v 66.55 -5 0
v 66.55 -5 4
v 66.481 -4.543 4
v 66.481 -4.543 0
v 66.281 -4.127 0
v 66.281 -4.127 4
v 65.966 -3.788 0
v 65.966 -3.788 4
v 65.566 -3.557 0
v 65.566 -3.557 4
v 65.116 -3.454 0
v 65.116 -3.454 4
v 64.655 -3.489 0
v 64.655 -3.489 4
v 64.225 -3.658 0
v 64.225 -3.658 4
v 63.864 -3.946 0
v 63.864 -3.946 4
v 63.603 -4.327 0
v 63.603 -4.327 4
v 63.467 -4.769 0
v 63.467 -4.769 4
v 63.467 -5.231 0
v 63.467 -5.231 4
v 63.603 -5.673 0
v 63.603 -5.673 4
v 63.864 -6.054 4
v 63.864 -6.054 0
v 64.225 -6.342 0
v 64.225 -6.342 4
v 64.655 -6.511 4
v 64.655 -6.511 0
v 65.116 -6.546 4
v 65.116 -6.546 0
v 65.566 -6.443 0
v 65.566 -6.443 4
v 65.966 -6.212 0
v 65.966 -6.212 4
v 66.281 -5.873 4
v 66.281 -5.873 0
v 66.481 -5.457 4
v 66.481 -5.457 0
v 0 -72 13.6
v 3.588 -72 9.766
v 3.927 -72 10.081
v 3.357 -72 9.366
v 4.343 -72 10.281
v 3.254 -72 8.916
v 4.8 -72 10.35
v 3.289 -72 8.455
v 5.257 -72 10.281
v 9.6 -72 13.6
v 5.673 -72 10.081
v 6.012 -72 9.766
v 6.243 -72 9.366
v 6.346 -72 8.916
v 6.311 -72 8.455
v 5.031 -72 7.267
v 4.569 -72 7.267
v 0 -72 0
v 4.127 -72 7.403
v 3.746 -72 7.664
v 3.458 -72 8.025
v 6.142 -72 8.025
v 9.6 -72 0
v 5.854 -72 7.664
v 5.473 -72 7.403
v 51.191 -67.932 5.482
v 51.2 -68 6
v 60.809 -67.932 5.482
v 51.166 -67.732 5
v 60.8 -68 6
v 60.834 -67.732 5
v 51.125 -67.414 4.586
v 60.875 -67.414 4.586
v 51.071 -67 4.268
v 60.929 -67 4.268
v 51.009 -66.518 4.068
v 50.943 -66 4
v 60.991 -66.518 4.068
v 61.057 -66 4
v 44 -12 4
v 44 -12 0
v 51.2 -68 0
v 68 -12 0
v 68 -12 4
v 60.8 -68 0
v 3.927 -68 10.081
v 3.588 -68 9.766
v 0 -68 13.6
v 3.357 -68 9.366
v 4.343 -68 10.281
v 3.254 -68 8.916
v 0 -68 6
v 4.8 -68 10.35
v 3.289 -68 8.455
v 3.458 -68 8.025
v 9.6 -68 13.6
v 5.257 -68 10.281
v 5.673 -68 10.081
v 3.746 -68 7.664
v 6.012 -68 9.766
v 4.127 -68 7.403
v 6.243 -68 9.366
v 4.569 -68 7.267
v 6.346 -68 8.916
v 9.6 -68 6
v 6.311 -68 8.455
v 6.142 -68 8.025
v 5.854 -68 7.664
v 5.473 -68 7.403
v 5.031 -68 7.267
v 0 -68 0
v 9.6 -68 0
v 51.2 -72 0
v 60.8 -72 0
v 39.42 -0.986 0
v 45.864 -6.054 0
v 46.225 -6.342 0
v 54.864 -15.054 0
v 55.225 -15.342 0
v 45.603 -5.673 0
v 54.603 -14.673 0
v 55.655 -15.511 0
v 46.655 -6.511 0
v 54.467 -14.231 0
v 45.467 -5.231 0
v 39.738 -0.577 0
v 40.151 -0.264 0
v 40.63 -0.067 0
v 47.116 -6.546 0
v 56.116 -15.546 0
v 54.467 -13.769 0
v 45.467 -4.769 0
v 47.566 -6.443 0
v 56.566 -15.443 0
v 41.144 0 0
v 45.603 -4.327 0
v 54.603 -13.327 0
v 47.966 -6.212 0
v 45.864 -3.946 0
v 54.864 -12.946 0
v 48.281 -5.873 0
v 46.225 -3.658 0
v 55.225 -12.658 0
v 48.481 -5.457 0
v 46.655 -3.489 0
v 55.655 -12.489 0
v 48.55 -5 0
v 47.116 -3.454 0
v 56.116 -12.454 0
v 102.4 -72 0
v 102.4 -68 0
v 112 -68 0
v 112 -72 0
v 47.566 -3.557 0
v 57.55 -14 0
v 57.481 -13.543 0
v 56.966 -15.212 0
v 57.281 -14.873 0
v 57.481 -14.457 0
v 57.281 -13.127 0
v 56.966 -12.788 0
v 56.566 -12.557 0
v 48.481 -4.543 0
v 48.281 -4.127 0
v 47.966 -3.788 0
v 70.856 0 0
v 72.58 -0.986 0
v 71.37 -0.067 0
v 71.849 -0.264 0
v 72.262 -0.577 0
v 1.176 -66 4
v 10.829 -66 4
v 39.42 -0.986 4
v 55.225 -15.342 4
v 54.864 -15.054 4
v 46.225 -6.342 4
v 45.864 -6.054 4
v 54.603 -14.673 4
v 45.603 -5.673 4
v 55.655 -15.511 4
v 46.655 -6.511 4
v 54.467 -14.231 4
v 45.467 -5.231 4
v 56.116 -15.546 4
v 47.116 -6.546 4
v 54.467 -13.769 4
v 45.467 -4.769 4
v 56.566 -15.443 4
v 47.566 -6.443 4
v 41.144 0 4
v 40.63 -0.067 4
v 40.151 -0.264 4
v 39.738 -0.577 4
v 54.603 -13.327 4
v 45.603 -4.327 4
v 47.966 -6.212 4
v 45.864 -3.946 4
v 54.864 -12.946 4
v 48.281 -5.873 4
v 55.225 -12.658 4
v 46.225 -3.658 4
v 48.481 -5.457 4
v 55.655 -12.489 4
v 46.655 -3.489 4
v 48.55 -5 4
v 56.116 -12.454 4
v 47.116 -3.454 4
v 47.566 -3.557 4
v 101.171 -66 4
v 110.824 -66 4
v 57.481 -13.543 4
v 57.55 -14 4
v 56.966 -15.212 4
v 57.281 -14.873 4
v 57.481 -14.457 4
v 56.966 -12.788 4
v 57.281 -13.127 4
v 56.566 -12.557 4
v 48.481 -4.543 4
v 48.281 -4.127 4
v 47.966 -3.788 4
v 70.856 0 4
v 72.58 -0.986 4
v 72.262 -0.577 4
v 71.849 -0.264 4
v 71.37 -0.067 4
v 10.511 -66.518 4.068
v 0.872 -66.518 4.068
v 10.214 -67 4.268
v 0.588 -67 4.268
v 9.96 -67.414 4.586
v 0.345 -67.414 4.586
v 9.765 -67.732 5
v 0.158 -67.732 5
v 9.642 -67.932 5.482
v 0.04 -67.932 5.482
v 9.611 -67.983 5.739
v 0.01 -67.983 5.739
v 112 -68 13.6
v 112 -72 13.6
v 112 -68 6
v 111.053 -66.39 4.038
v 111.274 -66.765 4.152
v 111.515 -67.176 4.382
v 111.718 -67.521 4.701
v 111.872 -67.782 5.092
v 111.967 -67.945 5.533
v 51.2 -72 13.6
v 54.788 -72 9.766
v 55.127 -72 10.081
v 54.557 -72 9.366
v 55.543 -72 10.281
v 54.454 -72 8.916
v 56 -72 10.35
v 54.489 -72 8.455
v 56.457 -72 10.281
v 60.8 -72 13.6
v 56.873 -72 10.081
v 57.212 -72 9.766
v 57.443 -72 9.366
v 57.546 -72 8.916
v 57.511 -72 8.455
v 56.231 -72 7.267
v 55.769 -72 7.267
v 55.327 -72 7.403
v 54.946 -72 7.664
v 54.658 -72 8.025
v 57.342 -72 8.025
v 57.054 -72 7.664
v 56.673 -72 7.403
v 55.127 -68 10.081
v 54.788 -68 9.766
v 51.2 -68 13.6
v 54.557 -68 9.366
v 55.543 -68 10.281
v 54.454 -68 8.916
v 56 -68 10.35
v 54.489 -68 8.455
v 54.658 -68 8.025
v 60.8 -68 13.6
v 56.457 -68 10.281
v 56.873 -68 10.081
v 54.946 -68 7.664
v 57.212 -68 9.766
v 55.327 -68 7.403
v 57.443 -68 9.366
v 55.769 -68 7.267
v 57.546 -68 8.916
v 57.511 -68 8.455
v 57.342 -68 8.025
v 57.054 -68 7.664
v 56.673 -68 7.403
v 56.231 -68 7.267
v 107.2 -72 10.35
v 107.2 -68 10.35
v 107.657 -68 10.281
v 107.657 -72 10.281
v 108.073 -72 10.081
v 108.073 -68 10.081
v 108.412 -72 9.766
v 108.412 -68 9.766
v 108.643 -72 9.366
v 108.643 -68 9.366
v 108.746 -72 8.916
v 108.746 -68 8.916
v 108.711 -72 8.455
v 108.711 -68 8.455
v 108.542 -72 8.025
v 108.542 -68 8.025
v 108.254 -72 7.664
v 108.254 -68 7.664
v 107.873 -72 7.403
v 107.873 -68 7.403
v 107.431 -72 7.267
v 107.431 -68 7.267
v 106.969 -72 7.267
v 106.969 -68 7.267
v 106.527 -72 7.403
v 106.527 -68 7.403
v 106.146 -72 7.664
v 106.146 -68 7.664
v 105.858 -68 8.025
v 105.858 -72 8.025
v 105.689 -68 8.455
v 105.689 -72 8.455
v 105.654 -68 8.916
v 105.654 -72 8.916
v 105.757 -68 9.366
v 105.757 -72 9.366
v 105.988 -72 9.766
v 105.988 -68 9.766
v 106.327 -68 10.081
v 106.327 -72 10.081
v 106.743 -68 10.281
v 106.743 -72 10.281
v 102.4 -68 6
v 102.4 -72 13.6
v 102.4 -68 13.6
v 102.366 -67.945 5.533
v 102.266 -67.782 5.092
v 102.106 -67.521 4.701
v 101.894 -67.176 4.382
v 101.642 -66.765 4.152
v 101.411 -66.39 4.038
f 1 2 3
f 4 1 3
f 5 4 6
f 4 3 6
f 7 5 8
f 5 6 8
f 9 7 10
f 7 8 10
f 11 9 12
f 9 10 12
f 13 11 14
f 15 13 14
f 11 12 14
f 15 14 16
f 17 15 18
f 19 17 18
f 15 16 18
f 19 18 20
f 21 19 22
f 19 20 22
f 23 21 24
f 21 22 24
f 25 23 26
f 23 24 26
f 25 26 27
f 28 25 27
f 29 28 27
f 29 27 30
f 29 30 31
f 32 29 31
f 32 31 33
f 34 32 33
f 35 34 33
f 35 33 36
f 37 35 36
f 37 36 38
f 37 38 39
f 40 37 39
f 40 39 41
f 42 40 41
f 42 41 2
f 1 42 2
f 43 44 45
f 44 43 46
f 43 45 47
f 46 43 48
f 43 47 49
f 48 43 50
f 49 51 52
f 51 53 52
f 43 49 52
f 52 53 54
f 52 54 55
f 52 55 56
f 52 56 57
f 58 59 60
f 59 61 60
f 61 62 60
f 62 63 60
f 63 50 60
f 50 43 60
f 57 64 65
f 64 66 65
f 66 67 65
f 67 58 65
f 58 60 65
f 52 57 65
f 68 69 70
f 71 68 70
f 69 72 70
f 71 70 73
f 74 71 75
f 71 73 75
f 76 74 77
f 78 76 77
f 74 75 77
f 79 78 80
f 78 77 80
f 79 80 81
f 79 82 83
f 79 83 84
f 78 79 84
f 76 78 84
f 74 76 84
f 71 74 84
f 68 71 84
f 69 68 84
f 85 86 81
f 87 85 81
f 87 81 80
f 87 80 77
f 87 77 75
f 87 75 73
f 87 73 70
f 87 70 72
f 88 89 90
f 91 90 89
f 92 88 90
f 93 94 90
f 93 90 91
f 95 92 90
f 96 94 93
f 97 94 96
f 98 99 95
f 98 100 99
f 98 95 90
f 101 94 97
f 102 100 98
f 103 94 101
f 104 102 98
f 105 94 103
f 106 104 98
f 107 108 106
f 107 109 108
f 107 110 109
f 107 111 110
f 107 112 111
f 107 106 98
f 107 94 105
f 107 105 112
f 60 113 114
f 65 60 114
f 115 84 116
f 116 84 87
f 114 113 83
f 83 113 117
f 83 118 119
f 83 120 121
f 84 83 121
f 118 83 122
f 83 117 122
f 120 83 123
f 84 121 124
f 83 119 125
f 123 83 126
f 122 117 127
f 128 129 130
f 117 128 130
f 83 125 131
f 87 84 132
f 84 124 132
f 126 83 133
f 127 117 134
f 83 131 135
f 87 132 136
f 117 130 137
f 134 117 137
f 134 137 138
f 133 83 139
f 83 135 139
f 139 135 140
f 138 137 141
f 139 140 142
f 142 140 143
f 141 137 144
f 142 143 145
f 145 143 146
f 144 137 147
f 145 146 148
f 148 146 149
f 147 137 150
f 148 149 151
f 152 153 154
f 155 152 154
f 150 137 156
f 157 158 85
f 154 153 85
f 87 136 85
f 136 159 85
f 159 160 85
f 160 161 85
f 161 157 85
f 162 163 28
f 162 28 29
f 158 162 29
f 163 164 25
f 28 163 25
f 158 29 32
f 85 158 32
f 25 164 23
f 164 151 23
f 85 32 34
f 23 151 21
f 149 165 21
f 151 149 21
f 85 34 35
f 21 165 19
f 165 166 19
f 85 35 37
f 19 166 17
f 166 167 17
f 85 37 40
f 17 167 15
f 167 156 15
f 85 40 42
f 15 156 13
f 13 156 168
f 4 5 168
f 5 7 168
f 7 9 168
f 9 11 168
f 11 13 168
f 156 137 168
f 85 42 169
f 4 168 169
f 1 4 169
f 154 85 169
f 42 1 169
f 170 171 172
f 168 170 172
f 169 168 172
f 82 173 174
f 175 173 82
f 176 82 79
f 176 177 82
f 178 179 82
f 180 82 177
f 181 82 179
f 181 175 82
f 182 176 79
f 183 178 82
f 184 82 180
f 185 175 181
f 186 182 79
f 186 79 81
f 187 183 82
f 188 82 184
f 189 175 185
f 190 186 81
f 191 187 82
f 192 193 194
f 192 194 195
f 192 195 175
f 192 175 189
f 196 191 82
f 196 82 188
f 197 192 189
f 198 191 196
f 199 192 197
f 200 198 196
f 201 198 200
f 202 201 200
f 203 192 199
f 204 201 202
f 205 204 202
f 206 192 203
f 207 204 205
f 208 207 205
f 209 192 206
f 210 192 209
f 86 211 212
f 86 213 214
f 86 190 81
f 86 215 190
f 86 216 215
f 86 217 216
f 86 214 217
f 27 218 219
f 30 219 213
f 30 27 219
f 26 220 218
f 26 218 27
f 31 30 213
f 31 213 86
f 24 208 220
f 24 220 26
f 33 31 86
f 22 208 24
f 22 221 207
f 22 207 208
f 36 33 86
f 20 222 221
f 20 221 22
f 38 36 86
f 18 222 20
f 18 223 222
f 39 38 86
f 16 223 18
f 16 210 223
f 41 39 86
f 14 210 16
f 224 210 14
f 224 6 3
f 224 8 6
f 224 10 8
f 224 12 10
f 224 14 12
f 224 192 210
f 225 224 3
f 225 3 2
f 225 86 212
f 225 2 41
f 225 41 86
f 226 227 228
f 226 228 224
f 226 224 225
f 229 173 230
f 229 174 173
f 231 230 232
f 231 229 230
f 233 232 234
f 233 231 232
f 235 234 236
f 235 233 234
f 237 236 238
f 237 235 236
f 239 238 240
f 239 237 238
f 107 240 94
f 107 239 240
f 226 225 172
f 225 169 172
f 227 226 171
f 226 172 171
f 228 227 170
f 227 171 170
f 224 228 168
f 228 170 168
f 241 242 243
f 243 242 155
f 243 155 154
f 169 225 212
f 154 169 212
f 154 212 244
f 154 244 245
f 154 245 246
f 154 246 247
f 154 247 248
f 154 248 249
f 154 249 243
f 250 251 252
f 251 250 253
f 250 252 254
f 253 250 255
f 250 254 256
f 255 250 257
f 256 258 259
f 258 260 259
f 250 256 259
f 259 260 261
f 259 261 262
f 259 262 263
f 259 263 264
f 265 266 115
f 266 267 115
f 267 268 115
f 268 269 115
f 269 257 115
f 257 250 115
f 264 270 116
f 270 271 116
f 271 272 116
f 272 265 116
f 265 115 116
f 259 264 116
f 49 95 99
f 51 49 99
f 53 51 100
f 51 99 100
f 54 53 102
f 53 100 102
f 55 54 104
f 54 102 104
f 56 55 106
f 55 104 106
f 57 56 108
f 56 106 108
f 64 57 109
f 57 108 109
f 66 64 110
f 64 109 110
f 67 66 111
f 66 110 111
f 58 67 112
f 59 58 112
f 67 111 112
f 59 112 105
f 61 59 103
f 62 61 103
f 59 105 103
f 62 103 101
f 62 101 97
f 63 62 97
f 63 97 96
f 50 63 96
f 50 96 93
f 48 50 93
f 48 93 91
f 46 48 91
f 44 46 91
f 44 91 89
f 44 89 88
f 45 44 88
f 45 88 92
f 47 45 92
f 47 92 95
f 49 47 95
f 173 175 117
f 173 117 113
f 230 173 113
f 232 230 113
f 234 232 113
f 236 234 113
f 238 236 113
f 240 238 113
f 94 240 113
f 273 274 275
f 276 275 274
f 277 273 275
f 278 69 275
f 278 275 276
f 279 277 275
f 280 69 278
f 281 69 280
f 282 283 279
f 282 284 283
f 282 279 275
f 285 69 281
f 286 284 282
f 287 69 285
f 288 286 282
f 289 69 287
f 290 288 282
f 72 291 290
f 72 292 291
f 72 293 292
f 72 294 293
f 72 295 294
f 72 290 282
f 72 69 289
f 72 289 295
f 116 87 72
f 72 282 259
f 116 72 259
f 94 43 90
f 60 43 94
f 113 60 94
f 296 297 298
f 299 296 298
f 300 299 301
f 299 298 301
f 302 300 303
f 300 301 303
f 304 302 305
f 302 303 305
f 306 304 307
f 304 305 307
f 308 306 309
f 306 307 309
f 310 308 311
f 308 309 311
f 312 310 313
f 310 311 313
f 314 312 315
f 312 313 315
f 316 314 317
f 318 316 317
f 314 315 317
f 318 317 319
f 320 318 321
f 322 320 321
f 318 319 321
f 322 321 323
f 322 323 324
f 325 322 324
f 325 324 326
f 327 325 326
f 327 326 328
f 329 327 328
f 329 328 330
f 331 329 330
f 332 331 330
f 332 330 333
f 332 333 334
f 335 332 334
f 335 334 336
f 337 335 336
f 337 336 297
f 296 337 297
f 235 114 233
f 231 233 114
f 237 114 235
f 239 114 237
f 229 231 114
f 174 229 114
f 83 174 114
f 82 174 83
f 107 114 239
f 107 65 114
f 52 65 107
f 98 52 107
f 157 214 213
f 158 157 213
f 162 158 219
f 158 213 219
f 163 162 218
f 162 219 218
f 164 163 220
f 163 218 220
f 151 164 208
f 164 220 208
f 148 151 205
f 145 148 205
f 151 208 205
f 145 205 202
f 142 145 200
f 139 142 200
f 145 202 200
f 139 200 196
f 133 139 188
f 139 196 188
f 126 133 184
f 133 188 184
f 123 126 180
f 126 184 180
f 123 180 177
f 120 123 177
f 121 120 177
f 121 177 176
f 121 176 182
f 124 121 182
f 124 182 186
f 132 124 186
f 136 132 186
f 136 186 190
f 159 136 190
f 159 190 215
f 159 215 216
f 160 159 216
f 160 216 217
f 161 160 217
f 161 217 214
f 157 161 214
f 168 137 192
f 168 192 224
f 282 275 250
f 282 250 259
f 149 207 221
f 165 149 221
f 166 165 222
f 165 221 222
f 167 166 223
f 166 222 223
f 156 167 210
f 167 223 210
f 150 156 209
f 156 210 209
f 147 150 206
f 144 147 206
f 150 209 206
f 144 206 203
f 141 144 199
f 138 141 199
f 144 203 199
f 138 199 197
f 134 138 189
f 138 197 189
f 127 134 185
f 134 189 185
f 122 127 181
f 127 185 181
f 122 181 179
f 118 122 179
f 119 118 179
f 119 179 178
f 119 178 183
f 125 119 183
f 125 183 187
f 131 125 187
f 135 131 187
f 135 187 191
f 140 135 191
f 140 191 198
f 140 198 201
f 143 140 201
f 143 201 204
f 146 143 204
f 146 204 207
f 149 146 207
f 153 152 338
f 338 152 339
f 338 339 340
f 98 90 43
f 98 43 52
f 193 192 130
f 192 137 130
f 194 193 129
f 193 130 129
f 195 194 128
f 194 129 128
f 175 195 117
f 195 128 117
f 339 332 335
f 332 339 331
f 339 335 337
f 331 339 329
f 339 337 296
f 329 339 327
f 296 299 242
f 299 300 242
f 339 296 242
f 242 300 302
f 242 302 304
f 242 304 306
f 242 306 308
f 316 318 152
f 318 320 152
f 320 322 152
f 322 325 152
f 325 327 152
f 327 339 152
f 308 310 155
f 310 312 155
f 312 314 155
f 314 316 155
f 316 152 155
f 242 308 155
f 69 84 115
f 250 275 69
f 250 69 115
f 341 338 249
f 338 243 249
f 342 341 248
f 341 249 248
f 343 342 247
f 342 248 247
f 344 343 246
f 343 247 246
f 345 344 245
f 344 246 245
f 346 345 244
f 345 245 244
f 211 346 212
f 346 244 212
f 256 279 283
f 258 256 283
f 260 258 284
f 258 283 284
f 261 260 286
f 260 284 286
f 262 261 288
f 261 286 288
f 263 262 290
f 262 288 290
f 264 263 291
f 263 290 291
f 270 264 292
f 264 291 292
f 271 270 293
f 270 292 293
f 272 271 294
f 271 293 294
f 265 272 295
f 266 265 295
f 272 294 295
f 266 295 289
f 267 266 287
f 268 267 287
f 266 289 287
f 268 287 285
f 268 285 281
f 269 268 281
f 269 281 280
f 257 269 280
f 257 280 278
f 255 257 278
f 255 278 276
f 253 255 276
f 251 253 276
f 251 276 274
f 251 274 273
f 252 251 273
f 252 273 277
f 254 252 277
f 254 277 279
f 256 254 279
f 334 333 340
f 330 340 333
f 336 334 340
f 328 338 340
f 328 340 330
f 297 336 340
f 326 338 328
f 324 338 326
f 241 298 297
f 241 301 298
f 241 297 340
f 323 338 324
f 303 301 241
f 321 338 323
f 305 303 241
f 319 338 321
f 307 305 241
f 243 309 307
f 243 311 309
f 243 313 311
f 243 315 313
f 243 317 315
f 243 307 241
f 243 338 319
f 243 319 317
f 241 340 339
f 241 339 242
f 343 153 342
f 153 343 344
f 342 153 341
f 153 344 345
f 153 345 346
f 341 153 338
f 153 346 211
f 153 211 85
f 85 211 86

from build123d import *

# Parameters (mm, degrees)
SKETCH1_W           = 112
SKETCH1_H           = 72
BOSS_EXTRUDE1_DEPTH = 4
SKETCH2_W           = 9.6
SKETCH2_H           = 4
BOSS_EXTRUDE2_DEPTH = 9.6
SKETCH3_R           = 1.55
CUT_EXTRUDE1_DEPTH  = 9.6
SKETCH4_R           = 1.55
CUT_EXTRUDE2_DEPTH  = 9.6
CUT_EXTRUDE4_DEPTH  = 9.6
CUT_EXTRUDE5_DEPTH  = 9.6
FILLET1_R           = 2
FILLET2_R           = 2


with BuildPart() as part:
    # Sketch1 → Boss-Extrude1 (new body)
    with BuildSketch(Plane.XY):
        with Locations((56, -36)):
            Rectangle(SKETCH1_W, SKETCH1_H)
    extrude(amount=BOSS_EXTRUDE1_DEPTH)

    # Sketch2 → Boss-Extrude2 (add)
    with BuildSketch(Plane.XY.offset(4)):
        with Locations((4.8, -70)):
            Rectangle(SKETCH2_W, SKETCH2_H)
        with Locations((107.2, -70)):
            Rectangle(SKETCH2_W, SKETCH2_H)
        with Locations((56, -70)):
            Rectangle(SKETCH2_W, SKETCH2_H)
    extrude(amount=BOSS_EXTRUDE2_DEPTH)

    # Sketch3 → Cut-Extrude1 (cut)
    with BuildSketch(Plane(origin=(0, -68, 0), x_dir=(1, 0, 0), z_dir=(0, 1, 0))):
        with Locations(Location((4.8, -8.8, 0), (0, 0, 270))):
            Circle(SKETCH3_R)
        with Locations(Location((56, -8.8, 0), (0, 0, 270))):
            Circle(SKETCH3_R)
        with Locations(Location((107.2, -8.8, 0), (0, 0, 270))):
            Circle(SKETCH3_R)
    extrude(amount=-CUT_EXTRUDE1_DEPTH, mode=Mode.SUBTRACT)

    # Sketch4 → Cut-Extrude2 (cut)
    with BuildSketch(Plane.XY.offset(4)):
        with Locations((47, -5)):
            Circle(SKETCH4_R)
        with Locations((65, -5)):
            Circle(SKETCH4_R)
        with Locations((56, -14)):
            Circle(SKETCH4_R)
    extrude(amount=-CUT_EXTRUDE2_DEPTH, mode=Mode.SUBTRACT)

    # Sketch5 → Cut-Extrude4 (cut)
    with BuildSketch(Plane.XY.offset(4)):
        Polygon((0, -68), (0, 0), (40, 0), align=None)
        Polygon((72, 0), (112, -68), (112, 0), align=None)
    extrude(amount=-CUT_EXTRUDE4_DEPTH, mode=Mode.SUBTRACT)

    # Sketch6 → Cut-Extrude5 (cut)
    with BuildSketch(Plane.XY.offset(4)):
        Polygon((9.6, -68), (44, -12), (51.2, -68), (51.2, -72), (9.6, -72), align=None)
        Polygon((102.4, -72), (102.4, -68), (68, -12), (60.8, -68), (60.8, -72), align=None)
    extrude(amount=-CUT_EXTRUDE5_DEPTH, mode=Mode.SUBTRACT)

    # Fillet1
    fillet1_edges = [part.edges().sort_by_distance(p)[0] for p in [
        (4.8, -68, 4),
        (107.2, -68, 4),
        (56, -68, 4),
    ]]
    fillet(fillet1_edges, radius=FILLET1_R)

    # Fillet2
    fillet2_edges = [part.edges().sort_by_distance(p)[0] for p in [
        (40, 0, 2),
        (72, 0, 2),
    ]]
    fillet(fillet2_edges, radius=FILLET2_R)


solid = part.part
